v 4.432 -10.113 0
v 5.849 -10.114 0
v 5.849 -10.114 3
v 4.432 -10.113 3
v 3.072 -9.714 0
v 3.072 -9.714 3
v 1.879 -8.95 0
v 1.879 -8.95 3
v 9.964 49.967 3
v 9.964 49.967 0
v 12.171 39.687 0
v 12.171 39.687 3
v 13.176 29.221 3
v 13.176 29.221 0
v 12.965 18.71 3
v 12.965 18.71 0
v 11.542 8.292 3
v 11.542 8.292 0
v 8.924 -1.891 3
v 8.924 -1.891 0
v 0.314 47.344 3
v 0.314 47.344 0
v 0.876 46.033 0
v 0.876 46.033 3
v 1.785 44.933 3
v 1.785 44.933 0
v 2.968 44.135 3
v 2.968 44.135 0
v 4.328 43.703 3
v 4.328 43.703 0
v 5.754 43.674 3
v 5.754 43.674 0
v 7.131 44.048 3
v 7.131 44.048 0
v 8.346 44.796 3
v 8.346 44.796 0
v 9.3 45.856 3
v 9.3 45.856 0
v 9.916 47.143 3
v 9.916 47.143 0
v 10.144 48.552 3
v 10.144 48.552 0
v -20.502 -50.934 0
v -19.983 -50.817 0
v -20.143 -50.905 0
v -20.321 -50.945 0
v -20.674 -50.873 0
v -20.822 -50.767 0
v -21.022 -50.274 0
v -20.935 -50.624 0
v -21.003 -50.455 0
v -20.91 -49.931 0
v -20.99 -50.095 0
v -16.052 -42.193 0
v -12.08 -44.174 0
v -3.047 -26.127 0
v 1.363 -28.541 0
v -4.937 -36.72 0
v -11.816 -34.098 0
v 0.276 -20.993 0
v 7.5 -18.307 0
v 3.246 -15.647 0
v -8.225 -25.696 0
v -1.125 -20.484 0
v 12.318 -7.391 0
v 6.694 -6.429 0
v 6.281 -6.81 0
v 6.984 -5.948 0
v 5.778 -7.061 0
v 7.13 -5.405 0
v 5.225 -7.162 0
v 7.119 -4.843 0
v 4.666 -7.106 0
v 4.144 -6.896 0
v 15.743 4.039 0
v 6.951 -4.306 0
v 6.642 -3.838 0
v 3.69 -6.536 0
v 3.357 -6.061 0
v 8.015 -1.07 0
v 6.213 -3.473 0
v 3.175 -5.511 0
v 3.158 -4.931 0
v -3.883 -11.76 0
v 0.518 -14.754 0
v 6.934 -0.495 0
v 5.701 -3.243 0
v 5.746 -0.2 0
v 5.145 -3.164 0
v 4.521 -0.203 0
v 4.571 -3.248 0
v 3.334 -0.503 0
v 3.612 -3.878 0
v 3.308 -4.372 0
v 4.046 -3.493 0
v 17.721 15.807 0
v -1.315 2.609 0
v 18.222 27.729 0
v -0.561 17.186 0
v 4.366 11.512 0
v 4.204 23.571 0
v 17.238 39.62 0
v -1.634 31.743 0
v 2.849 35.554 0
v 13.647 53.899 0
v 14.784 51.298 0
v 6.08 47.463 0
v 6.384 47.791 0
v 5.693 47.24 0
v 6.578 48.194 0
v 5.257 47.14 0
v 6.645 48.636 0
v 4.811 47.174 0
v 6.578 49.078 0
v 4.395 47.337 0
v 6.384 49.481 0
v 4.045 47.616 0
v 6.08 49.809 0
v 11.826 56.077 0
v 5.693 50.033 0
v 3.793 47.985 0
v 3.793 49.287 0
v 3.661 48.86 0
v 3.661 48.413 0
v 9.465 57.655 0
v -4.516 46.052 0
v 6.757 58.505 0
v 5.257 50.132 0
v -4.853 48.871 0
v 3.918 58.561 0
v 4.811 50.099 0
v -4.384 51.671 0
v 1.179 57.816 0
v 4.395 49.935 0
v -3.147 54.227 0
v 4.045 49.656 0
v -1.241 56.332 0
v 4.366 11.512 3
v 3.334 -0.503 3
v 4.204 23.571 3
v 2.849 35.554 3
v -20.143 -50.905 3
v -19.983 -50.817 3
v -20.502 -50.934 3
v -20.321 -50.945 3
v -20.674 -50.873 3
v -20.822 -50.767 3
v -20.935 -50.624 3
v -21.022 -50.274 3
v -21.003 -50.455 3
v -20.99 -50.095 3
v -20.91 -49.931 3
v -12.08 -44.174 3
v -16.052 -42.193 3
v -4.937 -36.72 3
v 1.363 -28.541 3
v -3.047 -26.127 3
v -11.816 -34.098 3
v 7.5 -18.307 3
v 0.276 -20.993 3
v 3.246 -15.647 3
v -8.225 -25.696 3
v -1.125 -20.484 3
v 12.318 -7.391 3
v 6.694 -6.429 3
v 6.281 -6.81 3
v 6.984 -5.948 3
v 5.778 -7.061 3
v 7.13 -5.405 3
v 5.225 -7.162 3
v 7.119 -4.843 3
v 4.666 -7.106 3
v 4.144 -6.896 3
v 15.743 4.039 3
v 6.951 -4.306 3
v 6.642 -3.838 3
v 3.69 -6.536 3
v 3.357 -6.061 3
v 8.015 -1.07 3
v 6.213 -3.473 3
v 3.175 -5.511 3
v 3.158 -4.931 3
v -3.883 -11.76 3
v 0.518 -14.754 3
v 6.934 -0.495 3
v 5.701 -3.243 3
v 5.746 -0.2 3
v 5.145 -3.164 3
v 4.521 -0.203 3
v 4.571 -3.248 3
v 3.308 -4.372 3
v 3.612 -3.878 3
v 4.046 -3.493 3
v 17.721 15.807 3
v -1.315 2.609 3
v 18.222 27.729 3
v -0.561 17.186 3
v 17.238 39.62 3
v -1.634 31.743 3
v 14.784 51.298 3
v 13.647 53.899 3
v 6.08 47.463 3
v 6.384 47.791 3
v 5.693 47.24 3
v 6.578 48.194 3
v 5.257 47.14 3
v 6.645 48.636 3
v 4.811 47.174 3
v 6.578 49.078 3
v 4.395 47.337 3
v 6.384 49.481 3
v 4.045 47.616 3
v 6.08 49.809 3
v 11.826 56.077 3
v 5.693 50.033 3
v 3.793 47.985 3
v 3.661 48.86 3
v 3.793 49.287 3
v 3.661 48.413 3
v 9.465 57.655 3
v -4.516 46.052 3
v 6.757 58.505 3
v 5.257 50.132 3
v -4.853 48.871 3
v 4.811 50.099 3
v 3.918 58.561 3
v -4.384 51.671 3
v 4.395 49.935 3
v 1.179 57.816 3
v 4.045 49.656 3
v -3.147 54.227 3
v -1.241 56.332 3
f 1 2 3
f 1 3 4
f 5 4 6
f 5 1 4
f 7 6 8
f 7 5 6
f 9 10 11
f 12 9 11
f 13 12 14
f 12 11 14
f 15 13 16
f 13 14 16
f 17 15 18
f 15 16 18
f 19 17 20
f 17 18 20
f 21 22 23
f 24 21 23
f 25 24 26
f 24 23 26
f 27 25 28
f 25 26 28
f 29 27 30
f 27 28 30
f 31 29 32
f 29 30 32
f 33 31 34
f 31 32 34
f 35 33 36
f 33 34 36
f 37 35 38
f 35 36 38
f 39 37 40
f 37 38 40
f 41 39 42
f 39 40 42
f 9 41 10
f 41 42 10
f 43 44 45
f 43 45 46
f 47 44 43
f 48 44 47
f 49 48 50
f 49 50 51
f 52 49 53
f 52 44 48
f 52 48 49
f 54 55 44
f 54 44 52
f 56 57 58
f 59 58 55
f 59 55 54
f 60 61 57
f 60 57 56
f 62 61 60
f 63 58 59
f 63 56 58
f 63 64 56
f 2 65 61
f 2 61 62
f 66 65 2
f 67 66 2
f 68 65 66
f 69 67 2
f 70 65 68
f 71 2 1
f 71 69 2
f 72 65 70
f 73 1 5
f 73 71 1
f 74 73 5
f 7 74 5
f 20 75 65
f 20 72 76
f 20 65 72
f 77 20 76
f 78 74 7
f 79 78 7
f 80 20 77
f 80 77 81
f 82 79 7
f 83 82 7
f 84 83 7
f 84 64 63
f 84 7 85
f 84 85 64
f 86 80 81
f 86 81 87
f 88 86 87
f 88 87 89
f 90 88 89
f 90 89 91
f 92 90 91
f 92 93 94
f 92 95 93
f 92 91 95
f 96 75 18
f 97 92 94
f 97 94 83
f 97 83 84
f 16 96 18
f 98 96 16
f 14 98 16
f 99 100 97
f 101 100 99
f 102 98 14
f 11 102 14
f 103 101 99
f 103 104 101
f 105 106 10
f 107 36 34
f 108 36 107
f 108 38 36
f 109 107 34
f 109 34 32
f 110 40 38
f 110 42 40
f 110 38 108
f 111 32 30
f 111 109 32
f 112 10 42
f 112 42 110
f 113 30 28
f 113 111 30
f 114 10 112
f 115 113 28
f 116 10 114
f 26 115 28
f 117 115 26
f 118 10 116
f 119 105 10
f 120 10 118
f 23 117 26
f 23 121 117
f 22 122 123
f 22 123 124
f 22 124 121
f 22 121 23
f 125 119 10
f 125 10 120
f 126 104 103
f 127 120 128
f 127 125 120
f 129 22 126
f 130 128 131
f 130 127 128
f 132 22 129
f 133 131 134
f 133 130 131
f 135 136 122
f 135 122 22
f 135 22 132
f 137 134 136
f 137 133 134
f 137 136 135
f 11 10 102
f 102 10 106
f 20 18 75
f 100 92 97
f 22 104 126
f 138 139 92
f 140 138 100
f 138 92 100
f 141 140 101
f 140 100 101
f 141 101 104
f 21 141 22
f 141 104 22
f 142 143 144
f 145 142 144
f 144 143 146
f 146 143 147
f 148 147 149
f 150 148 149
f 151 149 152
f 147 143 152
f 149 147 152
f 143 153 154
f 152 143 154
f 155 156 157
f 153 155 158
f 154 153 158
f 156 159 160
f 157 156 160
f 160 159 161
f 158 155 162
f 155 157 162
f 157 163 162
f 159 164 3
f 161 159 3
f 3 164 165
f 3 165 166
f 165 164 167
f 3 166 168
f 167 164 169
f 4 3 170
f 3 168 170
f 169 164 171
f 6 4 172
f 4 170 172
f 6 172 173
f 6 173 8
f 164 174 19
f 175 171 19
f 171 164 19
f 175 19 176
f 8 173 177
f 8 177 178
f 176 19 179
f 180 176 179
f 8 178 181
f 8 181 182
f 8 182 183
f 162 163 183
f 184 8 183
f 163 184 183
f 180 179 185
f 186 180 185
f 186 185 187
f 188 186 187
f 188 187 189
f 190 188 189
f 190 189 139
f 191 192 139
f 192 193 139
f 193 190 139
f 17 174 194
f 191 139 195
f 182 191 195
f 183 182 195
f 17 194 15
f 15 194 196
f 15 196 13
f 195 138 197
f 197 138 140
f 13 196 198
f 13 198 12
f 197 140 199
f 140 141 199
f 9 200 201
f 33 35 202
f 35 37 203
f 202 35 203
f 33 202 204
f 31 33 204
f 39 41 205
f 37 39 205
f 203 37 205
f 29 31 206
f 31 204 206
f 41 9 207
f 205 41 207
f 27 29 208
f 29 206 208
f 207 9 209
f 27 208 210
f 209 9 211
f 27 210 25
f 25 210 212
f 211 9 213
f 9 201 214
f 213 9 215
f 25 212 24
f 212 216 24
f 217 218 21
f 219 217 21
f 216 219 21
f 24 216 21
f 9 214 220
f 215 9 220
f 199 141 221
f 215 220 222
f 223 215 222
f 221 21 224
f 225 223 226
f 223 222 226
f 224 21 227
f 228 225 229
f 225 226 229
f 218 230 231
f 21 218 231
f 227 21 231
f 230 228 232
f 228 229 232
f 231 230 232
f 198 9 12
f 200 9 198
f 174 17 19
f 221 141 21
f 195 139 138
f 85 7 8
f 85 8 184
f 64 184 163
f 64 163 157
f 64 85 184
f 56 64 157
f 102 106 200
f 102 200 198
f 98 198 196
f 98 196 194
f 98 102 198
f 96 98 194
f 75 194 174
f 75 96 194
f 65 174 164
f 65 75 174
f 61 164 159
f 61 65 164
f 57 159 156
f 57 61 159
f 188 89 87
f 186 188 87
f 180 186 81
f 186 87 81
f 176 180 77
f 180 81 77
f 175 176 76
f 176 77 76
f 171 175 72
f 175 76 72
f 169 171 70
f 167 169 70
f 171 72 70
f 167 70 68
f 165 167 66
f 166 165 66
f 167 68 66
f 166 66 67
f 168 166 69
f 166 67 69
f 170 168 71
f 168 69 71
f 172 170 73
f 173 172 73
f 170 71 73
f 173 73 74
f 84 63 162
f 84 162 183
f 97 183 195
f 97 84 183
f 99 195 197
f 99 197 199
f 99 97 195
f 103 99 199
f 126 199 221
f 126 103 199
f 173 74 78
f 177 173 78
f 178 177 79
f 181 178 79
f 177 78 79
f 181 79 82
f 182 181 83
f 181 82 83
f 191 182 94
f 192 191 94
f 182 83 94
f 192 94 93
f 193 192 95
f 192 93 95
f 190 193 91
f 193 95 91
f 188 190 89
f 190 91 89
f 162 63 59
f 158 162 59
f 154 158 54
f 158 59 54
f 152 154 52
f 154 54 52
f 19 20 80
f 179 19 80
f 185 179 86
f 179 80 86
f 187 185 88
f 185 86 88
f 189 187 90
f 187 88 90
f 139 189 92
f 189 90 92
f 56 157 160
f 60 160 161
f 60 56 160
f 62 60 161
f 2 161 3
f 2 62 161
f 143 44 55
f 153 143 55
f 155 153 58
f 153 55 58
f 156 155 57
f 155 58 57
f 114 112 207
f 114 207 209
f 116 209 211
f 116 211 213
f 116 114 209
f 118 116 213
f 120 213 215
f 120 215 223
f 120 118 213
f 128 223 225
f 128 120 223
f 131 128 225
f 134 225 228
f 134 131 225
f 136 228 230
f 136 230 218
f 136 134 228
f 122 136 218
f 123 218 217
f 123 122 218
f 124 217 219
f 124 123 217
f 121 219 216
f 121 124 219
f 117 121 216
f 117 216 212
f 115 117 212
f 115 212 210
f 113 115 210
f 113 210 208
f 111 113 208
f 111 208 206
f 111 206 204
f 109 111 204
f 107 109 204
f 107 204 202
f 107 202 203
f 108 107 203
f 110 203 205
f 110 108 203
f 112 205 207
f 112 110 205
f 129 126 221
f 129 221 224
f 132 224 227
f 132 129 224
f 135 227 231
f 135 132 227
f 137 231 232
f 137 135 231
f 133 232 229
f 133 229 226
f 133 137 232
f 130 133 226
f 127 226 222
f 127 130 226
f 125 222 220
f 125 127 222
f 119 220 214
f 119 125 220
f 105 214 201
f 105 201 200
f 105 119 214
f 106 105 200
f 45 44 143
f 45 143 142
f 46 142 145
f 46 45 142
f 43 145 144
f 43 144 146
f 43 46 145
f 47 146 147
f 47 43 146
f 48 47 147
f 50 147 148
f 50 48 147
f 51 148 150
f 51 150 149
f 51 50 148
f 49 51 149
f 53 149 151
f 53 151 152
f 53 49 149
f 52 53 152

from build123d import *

# Parameters (mm, degrees)
SKETCH1_R           = 1.5
SKETCH1_R_2         = 2
EXTRUDE1_DEPTH      = 3
CUT_EXTRUDE1_DEPTH  = 10
BOSS_EXTRUDE1_DEPTH = 3
CUT_EXTRUDE2_DEPTH  = 5


with BuildPart() as part:
    # Sketch1 → Extrude1 (new body)
    with BuildSketch(Plane.XY):
        with BuildLine():
            ThreePointArc((-26.085308936, -49.243272897), (-24.983078735, -55.562467556), (-18.568566007, -55.596511855))
            ThreePointArc((-18.568566007, -55.596511855), (9.955092257, -6.447651038), (9.831223687, 50.378348795))
            ThreePointArc((9.831223687, 50.378348795), (4.259504767, 53.557286163), (0.144535316, 48.6362374))
            ThreePointArc((0.144535316, 48.6362374), (0.489229737, -3.910438591), (-26.085308936, -49.243272897))
        make_face()
        with BuildLine():
            ThreePointArc((4.144339435, -6.895700301), (3.212712938, -4.646015269), (5.144535316, -3.1637626))
            ThreePointArc((5.144535316, -3.1637626), (7.076357694, -5.681509932), (4.144339435, -6.895700301))
        make_face(mode=Mode.SUBTRACT)
        with Locations((5.144535316, 48.6362374)):
            Circle(SKETCH1_R, mode=Mode.SUBTRACT)
        with Locations((-21.755464684, -51.7437626)):
            Circle(SKETCH1_R_2, mode=Mode.SUBTRACT)
    extrude(amount=EXTRUDE1_DEPTH)

    # Sketch3 → Cut-Extrude1 (cut)
    with BuildSketch(Plane(origin=(0, 0, 0), x_dir=(-1, 0, 0), z_dir=(0, 0, -1))):
        with BuildLine():
            ThreePointArc((26.085308936, -49.243272897), (16.272417408, -38.139391171), (8.225333931, -25.696181093))
            ThreePointArc((8.225333931, -25.696181093), (13.854681069, -38.186869472), (20.909608136, -49.931436277))
            ThreePointArc((20.909608136, -49.931436277), (22.829775371, -50.05679593), (23.755464684, -51.7437626))
            ThreePointArc((23.755464684, -51.7437626), (21.27804664, -53.685944881), (19.983392673, -50.816529735))
            ThreePointArc((19.983392673, -50.816529735), (8.408185994, -40.542939738), (-1.362976888, -28.540588427))
            ThreePointArc((-1.362976888, -28.540588427), (7.552683596, -42.842145312), (18.568566007, -55.596511855))
            ThreePointArc((18.568566007, -55.596511855), (24.983078735, -55.562467556), (26.085308936, -49.243272897))
        make_face()
    extrude(amount=-CUT_EXTRUDE1_DEPTH, mode=Mode.SUBTRACT)

    # Sketch3<3> → Boss-Extrude1 (add)
    with BuildSketch(Plane(origin=(0, 0, 0), x_dir=(-1, 0, 0), z_dir=(0, 0, -1))):
        with BuildLine():
            ThreePointArc((8.225333931, -25.696181093), (0.709764151, 9.885397236), (4.515866122, 46.052317111))
            ThreePointArc((4.515866122, 46.052317111), (-2.521867284, 58.28619141), (-14.783886482, 51.297610936))
            ThreePointArc((-14.783886482, 51.297610936), (-16.914814846, 9.892262753), (-1.362976888, -28.540588427))
            ThreePointArc((-1.362976888, -28.540588427), (-13.044605865, 10.119739731), (-9.831223687, 50.378348795))
            ThreePointArc((-9.831223687, 50.378348795), (-4.259504767, 53.557286163), (-0.144535316, 48.6362374))
            ThreePointArc((-0.144535316, 48.6362374), (-3.243862831, 10.649816422), (8.225333931, -25.696181093))
        make_face()
        with BuildLine():
            ThreePointArc((19.983392673, -50.816529735), (20.822206397, -50.767144538), (20.909608136, -49.931436277))
            ThreePointArc((20.909608136, -49.931436277), (20.37371395, -50.297814846), (19.983392673, -50.816529735))
        make_face()
    extrude(amount=-BOSS_EXTRUDE1_DEPTH)

    # Sketch4 → Cut-Extrude2 (cut)
    with BuildSketch(Plane(origin=(0, 0, 0), x_dir=(-1, 0, 0), z_dir=(0, 0, -1))):
        with BuildLine():
            ThreePointArc((-1.879022525, -8.950109944), (-3.738208311, -9.961912697), (-5.849425706, -10.11382619))
            ThreePointArc((-5.849425706, -10.11382619), (-1.805817512, -18.34494551), (3.046878131, -26.126554438))
            ThreePointArc((3.046878131, -26.126554438), (0.268148473, -17.628892121), (-1.879022525, -8.950109944))
        make_face()
        with BuildLine():
            ThreePointArc((-9.964210899, 49.966924168), (-13.222981584, 23.962412042), (-8.924214856, -1.890534442))
            ThreePointArc((-8.924214856, -1.890534442), (-6.34883687, -0.310963638), (-3.333762814, -0.503172193))
            ThreePointArc((-3.333762814, -0.503172193), (-4.204319589, 23.570760268), (-0.314334597, 47.344277255))
            ThreePointArc((-0.314334597, 47.344277255), (-6.455869332, 43.811260395), (-9.964210899, 49.966924168))
        make_face()
    extrude(amount=-CUT_EXTRUDE2_DEPTH, mode=Mode.SUBTRACT)


solid = part.part
